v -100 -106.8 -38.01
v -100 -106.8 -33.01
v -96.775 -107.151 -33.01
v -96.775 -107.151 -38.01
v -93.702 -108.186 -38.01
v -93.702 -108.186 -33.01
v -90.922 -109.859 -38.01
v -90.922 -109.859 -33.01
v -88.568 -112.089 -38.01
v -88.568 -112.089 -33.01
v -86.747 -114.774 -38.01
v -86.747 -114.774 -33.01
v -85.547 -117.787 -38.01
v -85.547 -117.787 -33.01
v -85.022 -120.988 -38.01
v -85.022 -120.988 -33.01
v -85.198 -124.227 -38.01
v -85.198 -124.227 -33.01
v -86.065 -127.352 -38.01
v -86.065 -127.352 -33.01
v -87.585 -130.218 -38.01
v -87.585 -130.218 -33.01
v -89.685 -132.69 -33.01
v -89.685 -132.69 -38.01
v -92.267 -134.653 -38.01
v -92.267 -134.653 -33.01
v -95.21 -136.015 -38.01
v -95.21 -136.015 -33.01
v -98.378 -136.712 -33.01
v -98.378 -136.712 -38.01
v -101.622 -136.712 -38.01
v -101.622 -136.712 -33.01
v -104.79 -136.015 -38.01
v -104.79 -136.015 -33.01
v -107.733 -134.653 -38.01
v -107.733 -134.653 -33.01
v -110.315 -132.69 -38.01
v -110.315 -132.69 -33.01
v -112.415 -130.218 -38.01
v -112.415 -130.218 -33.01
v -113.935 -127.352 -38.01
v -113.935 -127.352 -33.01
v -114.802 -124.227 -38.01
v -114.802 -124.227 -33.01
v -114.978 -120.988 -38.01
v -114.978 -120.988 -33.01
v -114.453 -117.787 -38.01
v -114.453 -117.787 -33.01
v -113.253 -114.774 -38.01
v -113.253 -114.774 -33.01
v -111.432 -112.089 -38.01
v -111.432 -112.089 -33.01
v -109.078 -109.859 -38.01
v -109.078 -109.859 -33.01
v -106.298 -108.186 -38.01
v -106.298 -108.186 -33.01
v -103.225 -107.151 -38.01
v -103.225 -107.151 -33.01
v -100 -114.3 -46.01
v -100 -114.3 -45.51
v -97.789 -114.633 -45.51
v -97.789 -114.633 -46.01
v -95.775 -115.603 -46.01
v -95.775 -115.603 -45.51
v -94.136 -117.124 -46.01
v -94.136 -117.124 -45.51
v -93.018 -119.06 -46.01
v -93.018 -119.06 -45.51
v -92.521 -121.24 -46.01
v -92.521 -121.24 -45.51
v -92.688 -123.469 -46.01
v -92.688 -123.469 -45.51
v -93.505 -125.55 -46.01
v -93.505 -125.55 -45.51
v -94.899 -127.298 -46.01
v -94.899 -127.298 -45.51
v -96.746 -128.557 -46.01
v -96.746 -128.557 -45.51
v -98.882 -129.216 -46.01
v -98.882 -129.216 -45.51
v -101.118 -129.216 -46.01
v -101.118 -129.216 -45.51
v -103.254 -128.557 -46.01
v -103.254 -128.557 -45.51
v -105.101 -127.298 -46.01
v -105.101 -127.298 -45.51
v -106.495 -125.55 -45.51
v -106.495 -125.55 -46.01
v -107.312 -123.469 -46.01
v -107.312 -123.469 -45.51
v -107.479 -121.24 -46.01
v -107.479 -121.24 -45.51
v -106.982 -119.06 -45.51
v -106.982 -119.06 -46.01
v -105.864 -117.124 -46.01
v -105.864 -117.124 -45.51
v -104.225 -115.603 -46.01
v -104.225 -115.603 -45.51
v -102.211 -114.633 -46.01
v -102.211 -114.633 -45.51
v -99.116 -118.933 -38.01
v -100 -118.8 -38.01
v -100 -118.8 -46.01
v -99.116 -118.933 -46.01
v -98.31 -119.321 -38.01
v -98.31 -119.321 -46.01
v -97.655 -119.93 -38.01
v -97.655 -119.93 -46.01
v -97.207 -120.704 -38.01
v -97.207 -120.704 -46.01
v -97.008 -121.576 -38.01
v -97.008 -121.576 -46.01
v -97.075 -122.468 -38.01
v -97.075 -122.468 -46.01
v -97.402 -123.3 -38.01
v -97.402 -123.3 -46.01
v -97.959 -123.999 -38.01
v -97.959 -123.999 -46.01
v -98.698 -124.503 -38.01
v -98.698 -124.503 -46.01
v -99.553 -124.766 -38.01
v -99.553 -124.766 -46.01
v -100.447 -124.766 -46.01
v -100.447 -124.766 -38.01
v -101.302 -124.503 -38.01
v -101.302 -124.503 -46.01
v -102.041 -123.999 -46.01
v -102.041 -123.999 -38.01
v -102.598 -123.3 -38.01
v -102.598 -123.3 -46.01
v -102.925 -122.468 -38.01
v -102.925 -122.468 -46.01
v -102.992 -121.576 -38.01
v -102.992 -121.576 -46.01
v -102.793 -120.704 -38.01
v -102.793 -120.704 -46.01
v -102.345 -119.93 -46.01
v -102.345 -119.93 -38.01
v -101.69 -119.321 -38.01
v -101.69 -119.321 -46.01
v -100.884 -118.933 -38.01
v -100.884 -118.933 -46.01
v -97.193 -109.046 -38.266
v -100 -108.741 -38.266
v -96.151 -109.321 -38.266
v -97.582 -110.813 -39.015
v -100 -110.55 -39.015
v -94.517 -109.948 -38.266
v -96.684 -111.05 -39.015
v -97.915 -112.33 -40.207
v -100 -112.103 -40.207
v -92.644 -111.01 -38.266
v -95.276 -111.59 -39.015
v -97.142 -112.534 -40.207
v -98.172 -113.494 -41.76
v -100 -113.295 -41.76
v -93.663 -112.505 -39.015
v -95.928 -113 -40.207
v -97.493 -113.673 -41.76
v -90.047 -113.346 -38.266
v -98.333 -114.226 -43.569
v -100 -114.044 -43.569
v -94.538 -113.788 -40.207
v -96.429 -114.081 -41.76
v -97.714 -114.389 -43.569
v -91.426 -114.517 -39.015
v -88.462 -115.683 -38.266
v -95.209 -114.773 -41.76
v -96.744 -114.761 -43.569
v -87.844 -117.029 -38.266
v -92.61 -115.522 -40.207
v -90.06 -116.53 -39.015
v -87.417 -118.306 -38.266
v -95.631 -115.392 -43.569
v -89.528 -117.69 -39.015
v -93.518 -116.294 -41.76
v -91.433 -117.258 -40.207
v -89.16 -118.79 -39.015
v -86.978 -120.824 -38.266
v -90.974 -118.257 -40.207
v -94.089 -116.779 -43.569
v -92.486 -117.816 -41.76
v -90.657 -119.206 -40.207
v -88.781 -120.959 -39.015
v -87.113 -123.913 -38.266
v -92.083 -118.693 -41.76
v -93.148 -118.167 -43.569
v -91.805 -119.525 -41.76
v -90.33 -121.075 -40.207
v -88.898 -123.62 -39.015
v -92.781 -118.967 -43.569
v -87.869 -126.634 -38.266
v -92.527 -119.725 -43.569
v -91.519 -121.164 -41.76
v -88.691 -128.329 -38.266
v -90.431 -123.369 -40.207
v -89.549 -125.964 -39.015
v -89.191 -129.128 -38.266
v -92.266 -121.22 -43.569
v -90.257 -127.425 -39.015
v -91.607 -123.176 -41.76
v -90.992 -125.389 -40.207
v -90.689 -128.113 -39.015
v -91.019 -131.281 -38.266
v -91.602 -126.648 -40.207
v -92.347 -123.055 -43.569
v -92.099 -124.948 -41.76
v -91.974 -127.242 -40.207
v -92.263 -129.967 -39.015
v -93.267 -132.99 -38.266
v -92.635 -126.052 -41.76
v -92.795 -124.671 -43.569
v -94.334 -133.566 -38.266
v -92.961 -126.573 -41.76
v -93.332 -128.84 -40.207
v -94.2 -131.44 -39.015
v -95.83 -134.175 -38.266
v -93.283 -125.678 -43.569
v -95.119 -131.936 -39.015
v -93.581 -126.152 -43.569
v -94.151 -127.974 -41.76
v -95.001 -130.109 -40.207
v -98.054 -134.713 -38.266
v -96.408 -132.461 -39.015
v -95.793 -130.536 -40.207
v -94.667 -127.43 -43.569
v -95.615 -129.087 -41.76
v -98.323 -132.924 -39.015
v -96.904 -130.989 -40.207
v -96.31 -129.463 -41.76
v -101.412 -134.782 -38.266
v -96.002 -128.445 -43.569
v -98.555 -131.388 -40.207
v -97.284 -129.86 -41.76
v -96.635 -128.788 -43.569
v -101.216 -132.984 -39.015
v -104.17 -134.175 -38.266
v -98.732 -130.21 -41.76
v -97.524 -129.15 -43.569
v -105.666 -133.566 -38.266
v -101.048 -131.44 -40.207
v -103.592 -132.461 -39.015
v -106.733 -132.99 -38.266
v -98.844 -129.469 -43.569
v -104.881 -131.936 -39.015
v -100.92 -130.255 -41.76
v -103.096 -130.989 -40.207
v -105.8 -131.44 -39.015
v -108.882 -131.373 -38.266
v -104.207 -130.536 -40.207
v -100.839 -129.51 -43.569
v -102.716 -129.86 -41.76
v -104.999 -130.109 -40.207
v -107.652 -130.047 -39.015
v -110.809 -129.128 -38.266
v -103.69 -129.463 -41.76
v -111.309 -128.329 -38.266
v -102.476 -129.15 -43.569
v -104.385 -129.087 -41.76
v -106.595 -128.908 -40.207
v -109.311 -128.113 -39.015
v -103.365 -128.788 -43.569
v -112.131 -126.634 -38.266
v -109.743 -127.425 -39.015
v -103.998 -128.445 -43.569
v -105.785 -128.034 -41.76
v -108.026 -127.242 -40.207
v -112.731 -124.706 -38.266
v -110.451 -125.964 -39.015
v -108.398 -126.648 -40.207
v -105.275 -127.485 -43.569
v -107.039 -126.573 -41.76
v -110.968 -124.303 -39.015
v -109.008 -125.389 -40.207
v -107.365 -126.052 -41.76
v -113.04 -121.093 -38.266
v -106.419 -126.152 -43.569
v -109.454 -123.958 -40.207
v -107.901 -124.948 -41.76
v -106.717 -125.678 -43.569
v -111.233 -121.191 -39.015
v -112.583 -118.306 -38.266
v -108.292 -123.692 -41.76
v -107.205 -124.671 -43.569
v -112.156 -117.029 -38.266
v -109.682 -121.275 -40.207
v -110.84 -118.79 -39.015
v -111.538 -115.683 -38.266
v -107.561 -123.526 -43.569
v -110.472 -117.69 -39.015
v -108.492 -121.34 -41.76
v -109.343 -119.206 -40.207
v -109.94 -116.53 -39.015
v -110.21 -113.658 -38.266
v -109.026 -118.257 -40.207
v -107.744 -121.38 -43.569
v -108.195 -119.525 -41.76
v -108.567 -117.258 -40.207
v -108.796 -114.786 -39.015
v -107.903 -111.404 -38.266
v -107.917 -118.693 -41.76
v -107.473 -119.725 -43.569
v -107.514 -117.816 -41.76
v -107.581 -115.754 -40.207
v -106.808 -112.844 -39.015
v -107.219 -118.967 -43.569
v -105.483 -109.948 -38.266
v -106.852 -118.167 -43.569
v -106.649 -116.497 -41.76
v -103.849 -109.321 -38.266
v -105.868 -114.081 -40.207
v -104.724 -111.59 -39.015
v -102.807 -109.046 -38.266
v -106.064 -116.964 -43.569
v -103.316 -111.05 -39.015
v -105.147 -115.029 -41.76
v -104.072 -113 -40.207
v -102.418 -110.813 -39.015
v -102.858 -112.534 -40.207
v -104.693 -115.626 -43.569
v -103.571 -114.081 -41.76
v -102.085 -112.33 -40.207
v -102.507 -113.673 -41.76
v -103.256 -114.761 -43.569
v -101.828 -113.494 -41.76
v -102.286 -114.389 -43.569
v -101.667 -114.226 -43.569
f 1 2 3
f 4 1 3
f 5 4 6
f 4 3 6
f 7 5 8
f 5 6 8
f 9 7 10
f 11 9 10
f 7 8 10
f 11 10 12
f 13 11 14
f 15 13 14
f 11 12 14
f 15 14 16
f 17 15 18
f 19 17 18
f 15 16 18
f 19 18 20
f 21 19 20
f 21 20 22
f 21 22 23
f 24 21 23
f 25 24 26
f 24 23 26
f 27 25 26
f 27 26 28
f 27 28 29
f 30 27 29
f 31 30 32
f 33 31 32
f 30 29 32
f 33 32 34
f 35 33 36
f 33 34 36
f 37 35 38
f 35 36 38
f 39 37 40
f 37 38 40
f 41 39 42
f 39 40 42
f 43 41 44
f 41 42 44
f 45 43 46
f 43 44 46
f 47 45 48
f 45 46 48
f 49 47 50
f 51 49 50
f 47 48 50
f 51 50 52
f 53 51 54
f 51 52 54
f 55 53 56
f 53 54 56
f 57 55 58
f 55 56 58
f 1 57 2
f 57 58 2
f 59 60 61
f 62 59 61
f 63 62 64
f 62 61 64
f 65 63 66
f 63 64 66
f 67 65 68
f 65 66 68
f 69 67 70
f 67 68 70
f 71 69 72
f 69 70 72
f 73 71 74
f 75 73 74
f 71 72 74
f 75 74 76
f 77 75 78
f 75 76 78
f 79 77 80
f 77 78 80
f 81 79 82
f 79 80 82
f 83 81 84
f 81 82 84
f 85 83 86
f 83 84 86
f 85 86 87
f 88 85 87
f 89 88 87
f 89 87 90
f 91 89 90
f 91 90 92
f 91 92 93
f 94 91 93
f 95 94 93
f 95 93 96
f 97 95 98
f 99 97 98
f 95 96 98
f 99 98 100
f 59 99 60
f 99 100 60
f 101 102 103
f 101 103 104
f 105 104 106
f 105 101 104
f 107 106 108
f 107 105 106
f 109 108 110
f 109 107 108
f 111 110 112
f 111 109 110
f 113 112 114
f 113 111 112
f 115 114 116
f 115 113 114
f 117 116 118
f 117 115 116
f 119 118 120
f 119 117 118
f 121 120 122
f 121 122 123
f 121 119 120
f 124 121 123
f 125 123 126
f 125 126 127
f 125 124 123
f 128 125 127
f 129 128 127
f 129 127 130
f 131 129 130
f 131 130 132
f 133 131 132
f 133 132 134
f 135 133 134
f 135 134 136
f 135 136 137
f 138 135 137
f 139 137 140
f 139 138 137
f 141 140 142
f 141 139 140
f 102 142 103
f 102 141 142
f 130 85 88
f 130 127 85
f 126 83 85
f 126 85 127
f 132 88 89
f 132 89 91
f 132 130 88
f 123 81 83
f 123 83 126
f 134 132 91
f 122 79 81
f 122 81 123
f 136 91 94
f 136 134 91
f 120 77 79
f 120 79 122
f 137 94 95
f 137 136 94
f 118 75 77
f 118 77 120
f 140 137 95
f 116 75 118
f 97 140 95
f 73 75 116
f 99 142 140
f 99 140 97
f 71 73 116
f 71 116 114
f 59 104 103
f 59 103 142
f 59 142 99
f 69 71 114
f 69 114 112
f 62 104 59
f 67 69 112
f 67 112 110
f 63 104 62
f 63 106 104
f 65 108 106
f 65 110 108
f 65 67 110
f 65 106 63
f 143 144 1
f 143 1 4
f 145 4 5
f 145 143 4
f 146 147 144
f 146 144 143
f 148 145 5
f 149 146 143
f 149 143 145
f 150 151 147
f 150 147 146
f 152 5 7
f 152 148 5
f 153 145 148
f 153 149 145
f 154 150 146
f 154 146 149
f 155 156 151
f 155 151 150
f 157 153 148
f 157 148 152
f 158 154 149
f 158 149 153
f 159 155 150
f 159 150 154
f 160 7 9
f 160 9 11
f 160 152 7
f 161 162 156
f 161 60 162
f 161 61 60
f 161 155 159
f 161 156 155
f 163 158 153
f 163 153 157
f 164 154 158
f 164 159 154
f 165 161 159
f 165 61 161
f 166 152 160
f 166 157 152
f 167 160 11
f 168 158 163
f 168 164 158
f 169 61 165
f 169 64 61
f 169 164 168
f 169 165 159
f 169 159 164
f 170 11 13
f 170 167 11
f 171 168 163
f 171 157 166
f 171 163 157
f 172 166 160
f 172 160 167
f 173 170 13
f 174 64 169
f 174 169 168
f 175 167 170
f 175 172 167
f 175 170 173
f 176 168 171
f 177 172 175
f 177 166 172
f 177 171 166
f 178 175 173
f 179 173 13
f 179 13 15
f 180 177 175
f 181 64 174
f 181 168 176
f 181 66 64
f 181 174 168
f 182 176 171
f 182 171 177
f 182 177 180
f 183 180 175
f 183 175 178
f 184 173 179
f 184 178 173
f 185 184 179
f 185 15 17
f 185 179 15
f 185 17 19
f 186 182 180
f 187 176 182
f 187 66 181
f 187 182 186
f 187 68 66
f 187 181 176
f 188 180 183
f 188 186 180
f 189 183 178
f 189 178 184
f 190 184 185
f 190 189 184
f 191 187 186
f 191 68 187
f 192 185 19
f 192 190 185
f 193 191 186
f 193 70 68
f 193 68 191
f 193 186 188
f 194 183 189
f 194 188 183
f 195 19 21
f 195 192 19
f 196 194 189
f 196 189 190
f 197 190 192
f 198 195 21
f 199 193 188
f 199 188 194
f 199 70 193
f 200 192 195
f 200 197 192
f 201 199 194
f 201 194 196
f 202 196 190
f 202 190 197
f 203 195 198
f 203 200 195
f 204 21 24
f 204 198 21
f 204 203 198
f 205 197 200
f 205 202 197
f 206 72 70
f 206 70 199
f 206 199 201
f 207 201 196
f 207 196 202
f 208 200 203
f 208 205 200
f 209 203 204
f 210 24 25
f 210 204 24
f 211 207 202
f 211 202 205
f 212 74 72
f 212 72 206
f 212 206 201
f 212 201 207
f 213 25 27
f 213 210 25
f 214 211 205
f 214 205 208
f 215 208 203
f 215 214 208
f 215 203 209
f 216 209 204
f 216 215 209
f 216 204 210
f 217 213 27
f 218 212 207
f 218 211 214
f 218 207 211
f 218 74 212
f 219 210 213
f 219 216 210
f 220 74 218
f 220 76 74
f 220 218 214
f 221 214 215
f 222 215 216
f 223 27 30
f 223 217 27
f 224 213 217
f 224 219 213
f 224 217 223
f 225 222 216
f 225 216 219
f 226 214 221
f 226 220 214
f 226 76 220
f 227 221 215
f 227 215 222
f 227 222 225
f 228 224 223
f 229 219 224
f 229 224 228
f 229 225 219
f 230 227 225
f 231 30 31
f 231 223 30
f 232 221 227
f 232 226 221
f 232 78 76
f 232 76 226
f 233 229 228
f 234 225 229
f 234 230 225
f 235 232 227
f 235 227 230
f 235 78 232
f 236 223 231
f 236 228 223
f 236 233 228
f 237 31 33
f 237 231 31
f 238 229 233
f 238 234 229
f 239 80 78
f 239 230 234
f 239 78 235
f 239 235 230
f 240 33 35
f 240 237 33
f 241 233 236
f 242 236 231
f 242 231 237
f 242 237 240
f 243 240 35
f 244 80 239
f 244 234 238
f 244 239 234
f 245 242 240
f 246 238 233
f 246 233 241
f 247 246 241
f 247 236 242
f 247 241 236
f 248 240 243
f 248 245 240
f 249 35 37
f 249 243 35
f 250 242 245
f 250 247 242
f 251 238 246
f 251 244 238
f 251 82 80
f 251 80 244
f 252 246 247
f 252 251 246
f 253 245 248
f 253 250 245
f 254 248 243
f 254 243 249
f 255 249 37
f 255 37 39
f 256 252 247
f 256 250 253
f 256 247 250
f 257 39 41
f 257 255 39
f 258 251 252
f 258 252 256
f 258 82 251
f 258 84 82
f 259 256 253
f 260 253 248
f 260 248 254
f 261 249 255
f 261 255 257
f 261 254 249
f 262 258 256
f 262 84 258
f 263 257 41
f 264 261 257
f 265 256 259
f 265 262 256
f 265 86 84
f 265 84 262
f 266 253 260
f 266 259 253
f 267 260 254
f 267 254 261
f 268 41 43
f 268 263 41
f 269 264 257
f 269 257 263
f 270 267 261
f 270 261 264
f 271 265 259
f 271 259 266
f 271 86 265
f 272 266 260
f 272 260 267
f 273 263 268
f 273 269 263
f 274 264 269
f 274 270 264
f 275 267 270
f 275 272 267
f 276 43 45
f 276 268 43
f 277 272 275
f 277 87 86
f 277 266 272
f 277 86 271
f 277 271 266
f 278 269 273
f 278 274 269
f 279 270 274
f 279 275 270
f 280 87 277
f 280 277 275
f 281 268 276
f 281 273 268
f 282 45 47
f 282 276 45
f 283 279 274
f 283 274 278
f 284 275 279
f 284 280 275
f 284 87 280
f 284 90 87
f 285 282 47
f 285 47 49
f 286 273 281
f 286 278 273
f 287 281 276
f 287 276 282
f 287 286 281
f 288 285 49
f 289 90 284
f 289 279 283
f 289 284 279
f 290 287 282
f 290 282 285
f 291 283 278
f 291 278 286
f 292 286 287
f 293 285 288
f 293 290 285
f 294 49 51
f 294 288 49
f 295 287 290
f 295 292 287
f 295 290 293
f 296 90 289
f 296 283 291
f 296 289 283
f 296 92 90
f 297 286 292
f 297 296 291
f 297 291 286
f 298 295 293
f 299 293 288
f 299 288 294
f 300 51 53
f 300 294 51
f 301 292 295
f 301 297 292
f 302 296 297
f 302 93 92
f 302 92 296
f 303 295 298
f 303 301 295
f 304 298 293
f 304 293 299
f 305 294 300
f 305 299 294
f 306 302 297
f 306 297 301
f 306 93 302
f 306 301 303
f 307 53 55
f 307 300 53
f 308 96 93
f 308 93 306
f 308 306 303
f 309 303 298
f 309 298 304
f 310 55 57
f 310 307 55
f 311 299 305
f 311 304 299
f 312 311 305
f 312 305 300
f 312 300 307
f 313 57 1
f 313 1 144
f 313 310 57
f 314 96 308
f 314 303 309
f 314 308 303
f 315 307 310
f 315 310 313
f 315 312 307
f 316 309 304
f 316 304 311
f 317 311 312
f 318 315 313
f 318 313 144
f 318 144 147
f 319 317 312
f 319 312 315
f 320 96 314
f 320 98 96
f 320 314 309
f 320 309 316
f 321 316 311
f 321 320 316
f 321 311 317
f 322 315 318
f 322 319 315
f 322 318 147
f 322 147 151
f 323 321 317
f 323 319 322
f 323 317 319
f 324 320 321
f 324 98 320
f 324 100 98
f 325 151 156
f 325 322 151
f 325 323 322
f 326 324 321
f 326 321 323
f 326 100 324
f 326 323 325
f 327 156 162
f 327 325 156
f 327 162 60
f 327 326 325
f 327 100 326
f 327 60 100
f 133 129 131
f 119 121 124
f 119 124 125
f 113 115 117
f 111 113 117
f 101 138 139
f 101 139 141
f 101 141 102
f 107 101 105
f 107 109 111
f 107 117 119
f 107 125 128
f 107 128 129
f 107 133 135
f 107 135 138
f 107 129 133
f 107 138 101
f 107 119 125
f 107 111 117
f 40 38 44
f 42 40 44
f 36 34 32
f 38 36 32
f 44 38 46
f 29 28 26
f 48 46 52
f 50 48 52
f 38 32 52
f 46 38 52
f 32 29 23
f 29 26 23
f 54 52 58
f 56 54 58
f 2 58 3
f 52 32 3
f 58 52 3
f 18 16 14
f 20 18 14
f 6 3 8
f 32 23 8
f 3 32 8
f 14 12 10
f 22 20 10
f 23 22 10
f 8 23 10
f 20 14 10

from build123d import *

# Parameters (mm, degrees)
SKETCH129_R             = 15
PAD067_DEPTH            = 5
SKETCH130_R             = 7.5
SKETCH130_R_2           = 3
PAD068_DEPTH            = 8
FILLET001_R             = 7.49999
BODY018_PLACEMENT_ANGLE = 90


with BuildPart() as part:
    # Sketch129 → Pad067 (new body)
    with BuildSketch(Plane.YZ):
        Circle(SKETCH129_R)
    extrude(amount=PAD067_DEPTH)

    # Sketch130 (on Face3 of Pad067) → Pad068 (join)
    with BuildSketch(Plane.YZ.offset(5)):
        Circle(SKETCH130_R)
        Circle(SKETCH130_R_2, mode=Mode.SUBTRACT)
    extrude(amount=PAD068_DEPTH)

    # Fillet001
    fillet001_edges = [part.edges().sort_by_distance(p)[0] for p in [
        (5, -7.5, 0),
    ]]
    fillet(fillet001_edges, radius=FILLET001_R)


with BuildPart() as part_1:
    # Body018 placement: moved
    add(part.part.moved(Location((-100, -121.8, -33.01))).rotate(Axis((-100, -121.8, -33.01), (0, 1, 0)), BODY018_PLACEMENT_ANGLE))


solid = part_1.part
